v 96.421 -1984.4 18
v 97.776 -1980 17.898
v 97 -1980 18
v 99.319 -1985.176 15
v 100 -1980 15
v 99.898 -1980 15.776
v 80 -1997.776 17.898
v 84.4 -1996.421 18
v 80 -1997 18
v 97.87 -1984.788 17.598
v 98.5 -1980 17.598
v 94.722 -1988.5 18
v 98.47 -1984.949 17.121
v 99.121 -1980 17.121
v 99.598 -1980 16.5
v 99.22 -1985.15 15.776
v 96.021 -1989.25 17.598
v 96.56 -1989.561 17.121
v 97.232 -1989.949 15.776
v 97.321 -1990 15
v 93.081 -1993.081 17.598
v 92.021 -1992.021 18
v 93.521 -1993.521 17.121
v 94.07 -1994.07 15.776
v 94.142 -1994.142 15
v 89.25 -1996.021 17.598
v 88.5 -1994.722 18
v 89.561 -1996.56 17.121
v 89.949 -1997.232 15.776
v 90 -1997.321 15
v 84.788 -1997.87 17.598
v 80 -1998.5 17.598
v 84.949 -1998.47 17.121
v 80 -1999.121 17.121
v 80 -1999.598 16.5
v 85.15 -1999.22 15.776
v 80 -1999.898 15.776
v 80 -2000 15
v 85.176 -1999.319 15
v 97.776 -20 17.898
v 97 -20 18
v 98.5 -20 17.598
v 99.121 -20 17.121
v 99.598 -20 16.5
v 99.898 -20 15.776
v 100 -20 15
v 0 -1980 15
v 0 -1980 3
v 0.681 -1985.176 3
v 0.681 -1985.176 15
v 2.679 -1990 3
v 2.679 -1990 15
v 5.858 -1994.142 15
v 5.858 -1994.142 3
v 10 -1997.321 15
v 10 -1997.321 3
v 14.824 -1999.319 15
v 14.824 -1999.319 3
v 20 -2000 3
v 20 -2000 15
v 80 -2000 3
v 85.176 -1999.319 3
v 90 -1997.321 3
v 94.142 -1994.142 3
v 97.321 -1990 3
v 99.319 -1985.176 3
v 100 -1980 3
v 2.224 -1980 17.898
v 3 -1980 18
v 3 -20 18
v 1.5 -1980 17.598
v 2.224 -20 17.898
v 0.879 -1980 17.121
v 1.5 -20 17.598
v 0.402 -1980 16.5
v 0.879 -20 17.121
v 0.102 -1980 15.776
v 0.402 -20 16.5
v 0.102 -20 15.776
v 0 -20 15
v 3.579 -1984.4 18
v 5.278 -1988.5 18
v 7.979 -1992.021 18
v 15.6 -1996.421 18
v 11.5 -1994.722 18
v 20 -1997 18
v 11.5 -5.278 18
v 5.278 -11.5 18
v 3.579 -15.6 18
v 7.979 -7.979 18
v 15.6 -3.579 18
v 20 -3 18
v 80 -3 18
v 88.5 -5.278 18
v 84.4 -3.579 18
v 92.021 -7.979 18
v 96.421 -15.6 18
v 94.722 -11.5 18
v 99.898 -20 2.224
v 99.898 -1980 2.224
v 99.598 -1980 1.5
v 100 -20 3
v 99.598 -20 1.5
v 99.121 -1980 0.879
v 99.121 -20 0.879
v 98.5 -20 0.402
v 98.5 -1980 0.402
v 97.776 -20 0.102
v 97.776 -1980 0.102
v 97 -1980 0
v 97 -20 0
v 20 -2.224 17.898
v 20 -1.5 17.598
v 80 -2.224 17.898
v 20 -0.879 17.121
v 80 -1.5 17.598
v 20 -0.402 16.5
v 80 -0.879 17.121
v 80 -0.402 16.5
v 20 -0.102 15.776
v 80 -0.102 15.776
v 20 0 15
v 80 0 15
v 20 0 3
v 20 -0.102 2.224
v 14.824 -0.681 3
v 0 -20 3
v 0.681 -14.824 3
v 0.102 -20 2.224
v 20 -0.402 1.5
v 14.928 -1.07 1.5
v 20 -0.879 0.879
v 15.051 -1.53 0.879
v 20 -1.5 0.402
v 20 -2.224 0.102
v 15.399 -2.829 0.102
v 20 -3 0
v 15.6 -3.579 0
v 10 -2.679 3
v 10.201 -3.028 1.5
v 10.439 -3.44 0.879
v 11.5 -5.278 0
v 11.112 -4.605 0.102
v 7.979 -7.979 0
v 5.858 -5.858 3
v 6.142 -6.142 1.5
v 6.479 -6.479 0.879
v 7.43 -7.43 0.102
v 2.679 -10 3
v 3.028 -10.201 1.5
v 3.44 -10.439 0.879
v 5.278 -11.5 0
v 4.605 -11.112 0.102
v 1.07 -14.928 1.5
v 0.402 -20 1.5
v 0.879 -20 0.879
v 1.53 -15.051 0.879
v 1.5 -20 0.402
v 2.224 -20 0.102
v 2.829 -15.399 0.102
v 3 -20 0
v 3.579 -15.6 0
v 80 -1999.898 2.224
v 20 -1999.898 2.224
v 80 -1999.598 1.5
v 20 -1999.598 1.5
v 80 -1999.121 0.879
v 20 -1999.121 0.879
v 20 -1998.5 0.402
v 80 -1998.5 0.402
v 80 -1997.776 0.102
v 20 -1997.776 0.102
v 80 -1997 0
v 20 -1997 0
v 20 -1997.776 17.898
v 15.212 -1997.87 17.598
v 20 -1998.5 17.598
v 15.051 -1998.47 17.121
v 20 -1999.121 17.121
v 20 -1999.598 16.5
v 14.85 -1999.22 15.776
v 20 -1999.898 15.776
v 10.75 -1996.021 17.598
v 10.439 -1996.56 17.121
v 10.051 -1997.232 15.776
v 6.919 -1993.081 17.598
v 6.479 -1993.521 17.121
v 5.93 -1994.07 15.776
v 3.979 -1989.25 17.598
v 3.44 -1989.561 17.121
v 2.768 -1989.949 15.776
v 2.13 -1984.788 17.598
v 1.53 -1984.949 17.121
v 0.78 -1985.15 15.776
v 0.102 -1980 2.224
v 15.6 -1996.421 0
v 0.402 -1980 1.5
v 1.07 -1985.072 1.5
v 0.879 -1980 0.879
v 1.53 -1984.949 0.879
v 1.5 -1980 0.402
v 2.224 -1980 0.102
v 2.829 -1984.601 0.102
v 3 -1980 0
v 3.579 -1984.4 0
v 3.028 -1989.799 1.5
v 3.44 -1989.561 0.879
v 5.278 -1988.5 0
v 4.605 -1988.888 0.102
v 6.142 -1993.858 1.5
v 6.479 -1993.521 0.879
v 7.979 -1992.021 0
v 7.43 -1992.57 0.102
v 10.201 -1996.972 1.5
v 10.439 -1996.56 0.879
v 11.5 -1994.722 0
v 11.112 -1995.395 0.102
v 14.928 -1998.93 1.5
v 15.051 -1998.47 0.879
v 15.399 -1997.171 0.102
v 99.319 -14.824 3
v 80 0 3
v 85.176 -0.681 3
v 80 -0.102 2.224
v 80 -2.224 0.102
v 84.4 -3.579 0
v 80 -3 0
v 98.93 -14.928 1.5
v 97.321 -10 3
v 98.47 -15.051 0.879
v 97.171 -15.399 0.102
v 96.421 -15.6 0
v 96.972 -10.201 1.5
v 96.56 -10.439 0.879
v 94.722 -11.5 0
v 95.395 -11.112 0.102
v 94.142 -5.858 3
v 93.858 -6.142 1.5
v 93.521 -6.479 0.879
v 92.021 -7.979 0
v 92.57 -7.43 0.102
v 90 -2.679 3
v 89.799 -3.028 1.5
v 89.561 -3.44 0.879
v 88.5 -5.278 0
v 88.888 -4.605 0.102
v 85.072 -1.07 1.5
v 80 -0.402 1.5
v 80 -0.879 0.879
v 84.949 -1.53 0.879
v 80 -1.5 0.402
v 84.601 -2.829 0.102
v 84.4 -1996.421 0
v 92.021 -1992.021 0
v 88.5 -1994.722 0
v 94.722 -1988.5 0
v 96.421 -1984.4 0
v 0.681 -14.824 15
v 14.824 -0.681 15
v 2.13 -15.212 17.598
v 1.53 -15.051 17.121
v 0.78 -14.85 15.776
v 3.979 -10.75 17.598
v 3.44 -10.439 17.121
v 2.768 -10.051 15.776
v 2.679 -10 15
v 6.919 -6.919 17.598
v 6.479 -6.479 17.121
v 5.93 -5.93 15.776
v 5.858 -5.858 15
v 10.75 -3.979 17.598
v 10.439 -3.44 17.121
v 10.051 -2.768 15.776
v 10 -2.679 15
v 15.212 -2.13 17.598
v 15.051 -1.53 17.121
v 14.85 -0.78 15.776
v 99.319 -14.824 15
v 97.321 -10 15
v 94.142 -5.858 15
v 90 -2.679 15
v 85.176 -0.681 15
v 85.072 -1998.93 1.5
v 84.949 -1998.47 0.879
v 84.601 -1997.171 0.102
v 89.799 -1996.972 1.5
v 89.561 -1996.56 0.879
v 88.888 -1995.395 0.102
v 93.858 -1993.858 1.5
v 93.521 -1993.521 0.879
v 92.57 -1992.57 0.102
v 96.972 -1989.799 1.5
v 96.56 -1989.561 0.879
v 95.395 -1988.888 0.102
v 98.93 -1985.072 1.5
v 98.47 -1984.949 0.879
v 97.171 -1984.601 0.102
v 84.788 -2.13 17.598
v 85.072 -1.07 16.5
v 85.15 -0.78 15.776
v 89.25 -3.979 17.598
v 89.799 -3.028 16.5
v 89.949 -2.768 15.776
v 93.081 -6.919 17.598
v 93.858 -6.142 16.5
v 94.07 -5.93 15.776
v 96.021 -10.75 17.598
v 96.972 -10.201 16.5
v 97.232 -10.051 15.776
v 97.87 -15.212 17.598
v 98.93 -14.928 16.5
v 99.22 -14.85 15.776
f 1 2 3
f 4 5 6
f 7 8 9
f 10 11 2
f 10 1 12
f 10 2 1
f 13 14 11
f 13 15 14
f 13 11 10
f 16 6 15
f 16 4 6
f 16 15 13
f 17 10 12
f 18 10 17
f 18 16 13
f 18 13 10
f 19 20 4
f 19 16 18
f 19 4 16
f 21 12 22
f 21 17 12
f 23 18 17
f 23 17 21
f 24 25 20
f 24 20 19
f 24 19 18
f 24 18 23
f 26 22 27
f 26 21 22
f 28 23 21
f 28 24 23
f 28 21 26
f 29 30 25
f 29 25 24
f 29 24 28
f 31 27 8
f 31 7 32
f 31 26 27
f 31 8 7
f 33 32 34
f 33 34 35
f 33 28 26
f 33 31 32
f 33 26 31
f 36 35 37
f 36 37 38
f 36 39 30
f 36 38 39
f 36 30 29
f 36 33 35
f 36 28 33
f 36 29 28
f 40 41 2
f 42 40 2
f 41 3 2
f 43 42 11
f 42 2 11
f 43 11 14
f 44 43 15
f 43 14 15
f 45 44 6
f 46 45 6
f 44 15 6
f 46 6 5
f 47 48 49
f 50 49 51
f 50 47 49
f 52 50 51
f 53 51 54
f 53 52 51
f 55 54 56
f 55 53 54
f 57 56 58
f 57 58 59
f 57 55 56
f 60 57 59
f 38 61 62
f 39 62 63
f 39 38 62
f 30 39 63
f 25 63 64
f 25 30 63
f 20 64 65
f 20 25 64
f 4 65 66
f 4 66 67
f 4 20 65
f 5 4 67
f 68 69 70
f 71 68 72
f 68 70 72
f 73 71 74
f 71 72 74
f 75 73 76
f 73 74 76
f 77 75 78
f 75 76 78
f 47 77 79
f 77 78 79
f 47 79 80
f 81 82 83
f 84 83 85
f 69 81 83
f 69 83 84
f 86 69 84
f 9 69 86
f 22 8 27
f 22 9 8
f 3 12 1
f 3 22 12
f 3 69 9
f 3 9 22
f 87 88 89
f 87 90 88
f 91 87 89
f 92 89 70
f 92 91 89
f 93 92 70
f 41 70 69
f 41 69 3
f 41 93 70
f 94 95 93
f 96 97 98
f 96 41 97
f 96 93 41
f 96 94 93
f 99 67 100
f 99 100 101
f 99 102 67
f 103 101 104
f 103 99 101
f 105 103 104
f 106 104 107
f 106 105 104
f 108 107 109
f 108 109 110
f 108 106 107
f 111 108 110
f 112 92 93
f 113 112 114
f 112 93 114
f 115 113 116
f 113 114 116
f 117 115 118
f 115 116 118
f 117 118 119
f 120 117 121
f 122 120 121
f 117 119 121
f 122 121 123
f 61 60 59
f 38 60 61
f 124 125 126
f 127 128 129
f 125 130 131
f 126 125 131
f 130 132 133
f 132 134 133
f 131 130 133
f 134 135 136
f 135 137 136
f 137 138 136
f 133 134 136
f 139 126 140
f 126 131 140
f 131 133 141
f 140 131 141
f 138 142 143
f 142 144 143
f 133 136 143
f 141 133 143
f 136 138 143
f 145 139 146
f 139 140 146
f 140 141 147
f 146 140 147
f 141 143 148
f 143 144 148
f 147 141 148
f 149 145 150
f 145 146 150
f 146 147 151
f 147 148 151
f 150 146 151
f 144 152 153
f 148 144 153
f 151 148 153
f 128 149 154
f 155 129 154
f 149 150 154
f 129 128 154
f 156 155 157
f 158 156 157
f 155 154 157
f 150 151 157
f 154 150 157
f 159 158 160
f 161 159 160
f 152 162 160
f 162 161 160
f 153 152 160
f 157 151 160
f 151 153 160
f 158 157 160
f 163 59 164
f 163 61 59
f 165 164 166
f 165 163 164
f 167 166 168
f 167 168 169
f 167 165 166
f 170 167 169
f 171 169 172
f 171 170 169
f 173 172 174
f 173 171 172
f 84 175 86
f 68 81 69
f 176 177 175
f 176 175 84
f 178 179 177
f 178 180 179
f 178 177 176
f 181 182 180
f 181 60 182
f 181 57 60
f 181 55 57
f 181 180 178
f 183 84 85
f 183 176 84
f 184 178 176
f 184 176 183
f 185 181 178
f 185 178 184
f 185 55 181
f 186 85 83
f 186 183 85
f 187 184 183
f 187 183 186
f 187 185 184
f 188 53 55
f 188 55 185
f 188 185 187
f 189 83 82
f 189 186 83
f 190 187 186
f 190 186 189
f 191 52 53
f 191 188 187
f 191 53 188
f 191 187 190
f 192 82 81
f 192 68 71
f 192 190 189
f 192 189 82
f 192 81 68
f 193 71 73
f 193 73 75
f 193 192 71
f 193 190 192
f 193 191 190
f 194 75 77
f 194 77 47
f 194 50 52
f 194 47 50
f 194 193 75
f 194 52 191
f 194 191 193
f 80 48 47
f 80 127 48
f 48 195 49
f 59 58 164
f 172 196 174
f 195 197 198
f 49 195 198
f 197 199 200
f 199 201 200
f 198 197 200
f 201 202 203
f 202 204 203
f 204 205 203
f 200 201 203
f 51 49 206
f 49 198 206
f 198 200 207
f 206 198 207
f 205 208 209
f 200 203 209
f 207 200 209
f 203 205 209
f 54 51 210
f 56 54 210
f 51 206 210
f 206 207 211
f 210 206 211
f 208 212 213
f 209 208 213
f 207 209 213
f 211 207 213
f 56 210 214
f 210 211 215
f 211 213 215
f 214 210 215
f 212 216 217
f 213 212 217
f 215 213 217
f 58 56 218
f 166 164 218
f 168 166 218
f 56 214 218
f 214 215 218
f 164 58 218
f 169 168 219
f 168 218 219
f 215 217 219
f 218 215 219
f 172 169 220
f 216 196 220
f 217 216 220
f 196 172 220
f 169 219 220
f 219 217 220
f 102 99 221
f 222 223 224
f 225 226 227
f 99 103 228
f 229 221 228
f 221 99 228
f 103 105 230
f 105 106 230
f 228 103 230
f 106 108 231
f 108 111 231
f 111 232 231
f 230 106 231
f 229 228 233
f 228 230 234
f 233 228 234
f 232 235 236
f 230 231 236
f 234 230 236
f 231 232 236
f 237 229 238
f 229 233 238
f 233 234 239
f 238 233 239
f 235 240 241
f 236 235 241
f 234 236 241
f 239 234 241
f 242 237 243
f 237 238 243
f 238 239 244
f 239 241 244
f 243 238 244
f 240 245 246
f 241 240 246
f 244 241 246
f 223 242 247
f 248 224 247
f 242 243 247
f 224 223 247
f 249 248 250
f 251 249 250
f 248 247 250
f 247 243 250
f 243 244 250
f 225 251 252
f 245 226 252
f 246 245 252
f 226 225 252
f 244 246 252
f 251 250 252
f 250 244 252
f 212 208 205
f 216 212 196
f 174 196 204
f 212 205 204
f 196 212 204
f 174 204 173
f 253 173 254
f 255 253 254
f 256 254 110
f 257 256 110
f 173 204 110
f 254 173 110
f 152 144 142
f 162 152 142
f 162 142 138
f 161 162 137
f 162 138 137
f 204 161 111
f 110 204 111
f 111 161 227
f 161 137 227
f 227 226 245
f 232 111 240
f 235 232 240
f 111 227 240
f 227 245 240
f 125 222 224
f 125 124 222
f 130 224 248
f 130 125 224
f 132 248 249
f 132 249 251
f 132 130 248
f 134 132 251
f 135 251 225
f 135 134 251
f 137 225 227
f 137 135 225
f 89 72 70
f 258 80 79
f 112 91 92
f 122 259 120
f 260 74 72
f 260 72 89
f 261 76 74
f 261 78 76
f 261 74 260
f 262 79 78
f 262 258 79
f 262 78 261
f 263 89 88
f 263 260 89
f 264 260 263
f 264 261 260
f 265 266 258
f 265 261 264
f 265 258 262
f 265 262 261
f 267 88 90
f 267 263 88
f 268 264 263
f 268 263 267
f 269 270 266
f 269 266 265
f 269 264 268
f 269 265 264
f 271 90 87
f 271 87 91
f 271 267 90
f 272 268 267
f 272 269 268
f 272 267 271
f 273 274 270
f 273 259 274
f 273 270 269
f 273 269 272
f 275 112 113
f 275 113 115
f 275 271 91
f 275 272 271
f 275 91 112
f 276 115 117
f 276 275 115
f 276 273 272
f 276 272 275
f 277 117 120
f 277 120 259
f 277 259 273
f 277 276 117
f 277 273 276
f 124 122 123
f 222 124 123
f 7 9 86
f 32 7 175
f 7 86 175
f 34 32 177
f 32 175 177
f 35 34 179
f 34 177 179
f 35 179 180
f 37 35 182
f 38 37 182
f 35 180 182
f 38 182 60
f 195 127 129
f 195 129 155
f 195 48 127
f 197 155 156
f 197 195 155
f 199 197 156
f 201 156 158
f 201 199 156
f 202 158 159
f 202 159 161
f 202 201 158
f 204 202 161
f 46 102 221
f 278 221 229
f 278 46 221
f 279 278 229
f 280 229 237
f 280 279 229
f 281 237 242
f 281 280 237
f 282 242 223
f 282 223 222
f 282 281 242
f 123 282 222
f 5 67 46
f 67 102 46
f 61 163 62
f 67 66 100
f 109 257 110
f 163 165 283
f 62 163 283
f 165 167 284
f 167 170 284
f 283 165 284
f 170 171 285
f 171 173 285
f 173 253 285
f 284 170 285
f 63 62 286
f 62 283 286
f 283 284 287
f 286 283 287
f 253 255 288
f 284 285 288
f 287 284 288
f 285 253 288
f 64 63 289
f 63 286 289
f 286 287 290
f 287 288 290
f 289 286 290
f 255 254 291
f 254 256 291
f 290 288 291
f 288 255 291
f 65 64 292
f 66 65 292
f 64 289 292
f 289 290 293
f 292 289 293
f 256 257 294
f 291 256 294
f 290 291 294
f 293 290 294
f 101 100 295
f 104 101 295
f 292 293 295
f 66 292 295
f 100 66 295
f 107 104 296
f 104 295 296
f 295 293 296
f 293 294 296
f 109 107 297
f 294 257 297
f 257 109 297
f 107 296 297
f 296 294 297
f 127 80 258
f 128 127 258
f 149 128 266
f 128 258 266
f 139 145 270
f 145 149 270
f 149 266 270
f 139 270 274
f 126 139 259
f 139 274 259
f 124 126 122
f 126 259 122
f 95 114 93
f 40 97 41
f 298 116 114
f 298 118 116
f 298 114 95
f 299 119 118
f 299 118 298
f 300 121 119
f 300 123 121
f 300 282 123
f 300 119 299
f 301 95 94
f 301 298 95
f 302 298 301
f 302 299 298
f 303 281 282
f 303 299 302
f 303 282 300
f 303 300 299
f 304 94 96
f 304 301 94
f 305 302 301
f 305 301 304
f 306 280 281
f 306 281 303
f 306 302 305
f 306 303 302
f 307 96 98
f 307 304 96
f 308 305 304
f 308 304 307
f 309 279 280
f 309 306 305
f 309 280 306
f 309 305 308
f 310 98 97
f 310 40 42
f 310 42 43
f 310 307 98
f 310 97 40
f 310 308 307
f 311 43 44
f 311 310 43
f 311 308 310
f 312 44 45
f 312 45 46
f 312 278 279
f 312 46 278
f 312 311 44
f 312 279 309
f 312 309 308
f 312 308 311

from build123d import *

# Parameters (mm, degrees)
F0_W     = 100
F0_H     = 18
F1_DEPTH = 2000
F3_R     = 20
F4_R     = 20
F5_R     = 3


with BuildPart() as f1:
    # F0 (on Front) → F1 (new body)
    with BuildSketch(Plane.XZ):
        with Locations((50, 9)):
            Rectangle(F0_W, F0_H)
    extrude(amount=F1_DEPTH)

    # F3
    f3_edges = [f1.edges().sort_by_distance(p)[0] for p in [
        (100, 0, 9),
        (0, 0, 9),
    ]]
    fillet(f3_edges, radius=F3_R)

    # F4
    f4_edges = [f1.edges().sort_by_distance(p)[0] for p in [
        (100, -2000, 9),
        (0, -2000, 9),
    ]]
    fillet(f4_edges, radius=F4_R)

    # F5
    f5_edges = [f1.edges().sort_by_distance(p)[0] for p in [
        (100, -1000, 18),
        (0, -1000, 0),
        (5.857864, -1994.142136, 0),
        (5.857864, -5.857864, 0),
        (50, -2000, 0),
        (50, 0, 0),
        (94.142136, -1994.142136, 0),
        (94.142136, -5.857864, 0),
        (100, -1000, 0),
    ]]
    fillet(f5_edges, radius=F5_R)


solid = f1.part
